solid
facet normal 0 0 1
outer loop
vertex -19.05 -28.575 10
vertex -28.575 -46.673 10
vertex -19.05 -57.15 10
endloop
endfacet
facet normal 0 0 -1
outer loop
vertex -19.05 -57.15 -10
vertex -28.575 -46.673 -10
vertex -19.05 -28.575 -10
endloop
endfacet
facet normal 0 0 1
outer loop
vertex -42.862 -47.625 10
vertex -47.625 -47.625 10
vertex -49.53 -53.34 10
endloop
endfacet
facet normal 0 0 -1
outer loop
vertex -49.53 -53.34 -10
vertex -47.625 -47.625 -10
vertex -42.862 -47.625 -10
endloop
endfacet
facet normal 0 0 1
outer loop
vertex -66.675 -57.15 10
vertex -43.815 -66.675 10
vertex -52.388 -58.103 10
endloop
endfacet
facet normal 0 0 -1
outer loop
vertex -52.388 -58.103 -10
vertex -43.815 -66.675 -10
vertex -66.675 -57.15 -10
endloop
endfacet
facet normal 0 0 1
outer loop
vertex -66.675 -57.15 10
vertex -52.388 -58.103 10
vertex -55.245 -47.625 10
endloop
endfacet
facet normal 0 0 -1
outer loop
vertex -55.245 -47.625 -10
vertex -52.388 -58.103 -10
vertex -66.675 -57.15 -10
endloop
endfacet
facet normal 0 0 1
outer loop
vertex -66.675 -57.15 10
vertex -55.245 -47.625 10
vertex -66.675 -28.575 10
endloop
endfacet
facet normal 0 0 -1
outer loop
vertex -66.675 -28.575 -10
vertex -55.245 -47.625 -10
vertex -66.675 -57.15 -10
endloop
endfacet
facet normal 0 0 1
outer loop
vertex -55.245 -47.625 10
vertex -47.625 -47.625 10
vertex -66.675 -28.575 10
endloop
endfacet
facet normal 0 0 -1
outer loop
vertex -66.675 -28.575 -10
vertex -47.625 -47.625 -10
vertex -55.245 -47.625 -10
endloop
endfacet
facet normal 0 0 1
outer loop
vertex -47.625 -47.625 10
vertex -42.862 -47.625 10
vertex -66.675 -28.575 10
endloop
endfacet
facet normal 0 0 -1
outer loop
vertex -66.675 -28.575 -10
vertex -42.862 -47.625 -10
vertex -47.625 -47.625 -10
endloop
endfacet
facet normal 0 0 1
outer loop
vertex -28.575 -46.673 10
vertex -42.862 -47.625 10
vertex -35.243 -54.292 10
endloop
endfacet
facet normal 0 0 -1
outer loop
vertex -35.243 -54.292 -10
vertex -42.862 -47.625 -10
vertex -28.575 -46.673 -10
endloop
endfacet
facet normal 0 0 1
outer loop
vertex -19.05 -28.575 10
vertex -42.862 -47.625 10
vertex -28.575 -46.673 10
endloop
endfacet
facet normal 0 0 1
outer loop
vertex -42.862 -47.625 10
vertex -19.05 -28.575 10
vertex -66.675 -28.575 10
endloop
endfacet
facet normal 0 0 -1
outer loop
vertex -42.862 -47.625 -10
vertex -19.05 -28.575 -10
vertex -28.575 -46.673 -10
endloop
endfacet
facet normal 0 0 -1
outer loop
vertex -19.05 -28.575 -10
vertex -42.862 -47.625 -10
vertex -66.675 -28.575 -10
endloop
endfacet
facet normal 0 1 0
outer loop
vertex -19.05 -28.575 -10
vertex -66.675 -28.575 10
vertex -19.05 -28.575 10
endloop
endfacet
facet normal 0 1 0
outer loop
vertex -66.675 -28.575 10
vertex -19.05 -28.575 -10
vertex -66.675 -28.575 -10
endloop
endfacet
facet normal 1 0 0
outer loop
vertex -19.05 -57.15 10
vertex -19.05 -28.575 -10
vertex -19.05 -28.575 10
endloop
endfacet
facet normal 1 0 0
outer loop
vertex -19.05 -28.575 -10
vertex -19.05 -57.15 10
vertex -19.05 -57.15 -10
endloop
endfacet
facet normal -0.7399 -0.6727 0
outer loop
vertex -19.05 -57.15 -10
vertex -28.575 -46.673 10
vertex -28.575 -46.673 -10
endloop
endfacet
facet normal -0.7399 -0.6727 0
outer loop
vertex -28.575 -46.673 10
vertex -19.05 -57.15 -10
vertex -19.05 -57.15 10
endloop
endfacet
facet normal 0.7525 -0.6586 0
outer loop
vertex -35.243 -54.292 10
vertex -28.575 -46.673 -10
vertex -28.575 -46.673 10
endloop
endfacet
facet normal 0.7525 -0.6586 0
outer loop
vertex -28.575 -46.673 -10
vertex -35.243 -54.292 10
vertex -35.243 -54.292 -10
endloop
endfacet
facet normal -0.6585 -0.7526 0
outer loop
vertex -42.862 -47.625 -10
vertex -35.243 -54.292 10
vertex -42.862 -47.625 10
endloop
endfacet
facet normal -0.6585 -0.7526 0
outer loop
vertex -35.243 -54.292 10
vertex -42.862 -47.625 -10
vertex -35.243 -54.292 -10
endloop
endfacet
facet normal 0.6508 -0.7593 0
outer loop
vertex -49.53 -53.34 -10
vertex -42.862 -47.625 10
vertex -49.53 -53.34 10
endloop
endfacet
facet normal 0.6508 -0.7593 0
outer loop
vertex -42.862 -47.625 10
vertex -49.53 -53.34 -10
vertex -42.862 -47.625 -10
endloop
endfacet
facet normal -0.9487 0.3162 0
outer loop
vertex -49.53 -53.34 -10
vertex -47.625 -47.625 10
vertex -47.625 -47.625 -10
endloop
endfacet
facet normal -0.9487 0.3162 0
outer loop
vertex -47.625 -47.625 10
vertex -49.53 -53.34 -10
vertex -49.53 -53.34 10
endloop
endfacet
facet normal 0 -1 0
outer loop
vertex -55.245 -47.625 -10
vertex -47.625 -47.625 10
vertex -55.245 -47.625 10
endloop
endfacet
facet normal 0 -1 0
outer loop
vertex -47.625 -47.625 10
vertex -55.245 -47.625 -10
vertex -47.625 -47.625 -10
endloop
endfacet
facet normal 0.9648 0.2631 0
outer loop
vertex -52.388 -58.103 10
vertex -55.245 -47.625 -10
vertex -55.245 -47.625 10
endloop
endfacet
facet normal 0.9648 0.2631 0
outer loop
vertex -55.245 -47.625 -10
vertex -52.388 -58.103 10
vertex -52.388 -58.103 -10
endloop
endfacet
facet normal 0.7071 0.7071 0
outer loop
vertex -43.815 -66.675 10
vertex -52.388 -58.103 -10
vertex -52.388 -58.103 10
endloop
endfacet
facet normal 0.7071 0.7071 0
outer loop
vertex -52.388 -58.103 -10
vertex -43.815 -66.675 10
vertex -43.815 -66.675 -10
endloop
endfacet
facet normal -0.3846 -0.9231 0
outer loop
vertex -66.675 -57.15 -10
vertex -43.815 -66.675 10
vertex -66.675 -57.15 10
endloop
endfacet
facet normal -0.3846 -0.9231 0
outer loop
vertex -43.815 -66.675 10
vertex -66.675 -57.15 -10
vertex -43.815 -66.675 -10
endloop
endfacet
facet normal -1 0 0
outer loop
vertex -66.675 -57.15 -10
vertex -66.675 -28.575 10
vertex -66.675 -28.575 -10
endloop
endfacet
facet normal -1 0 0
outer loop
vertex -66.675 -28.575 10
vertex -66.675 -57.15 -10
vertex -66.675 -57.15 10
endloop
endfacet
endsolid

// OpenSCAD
polyhedron(
    points=[
    [-66.675, -28.575, 10],
    [-19.05, -28.575, 10],
    [-19.05, -57.15, 10],
    [-28.575, -46.6725, 10],
    [-35.2425, -54.2925, 10],
    [-42.8625, -47.625, 10],
    [-49.53, -53.34, 10],
    [-47.625, -47.625, 10],
    [-55.245, -47.625, 10],
    [-52.3875, -58.1025, 10],
    [-43.815, -66.675, 10],
    [-66.675, -57.15, 10],
    [-66.675, -28.575, -10],
    [-19.05, -28.575, -10],
    [-19.05, -57.15, -10],
    [-28.575, -46.6725, -10],
    [-35.2425, -54.2925, -10],
    [-42.8625, -47.625, -10],
    [-49.53, -53.34, -10],
    [-47.625, -47.625, -10],
    [-55.245, -47.625, -10],
    [-52.3875, -58.1025, -10],
    [-43.815, -66.675, -10],
    [-66.675, -57.15, -10],
    ],
    faces=[
        [2,3,1],
        [13,15,14],
        [6,7,5],
        [17,19,18],
        [9,10,11],
        [23,22,21],
        [8,9,11],
        [23,21,20],
        [0,8,11],
        [23,20,12],
        [0,7,8],
        [20,19,12],
        [0,5,7],
        [19,17,12],
        [4,5,3],
        [15,17,16],
        [3,5,0,1],
        [13,12,17,15],
        [0,12,13,1],
        [1,13,14,2],
        [2,14,15,3],
        [3,15,16,4],
        [4,16,17,5],
        [5,17,18,6],
        [6,18,19,7],
        [7,19,20,8],
        [8,20,21,9],
        [9,21,22,10],
        [10,22,23,11],
        [11,23,12,0],
    ]
);
